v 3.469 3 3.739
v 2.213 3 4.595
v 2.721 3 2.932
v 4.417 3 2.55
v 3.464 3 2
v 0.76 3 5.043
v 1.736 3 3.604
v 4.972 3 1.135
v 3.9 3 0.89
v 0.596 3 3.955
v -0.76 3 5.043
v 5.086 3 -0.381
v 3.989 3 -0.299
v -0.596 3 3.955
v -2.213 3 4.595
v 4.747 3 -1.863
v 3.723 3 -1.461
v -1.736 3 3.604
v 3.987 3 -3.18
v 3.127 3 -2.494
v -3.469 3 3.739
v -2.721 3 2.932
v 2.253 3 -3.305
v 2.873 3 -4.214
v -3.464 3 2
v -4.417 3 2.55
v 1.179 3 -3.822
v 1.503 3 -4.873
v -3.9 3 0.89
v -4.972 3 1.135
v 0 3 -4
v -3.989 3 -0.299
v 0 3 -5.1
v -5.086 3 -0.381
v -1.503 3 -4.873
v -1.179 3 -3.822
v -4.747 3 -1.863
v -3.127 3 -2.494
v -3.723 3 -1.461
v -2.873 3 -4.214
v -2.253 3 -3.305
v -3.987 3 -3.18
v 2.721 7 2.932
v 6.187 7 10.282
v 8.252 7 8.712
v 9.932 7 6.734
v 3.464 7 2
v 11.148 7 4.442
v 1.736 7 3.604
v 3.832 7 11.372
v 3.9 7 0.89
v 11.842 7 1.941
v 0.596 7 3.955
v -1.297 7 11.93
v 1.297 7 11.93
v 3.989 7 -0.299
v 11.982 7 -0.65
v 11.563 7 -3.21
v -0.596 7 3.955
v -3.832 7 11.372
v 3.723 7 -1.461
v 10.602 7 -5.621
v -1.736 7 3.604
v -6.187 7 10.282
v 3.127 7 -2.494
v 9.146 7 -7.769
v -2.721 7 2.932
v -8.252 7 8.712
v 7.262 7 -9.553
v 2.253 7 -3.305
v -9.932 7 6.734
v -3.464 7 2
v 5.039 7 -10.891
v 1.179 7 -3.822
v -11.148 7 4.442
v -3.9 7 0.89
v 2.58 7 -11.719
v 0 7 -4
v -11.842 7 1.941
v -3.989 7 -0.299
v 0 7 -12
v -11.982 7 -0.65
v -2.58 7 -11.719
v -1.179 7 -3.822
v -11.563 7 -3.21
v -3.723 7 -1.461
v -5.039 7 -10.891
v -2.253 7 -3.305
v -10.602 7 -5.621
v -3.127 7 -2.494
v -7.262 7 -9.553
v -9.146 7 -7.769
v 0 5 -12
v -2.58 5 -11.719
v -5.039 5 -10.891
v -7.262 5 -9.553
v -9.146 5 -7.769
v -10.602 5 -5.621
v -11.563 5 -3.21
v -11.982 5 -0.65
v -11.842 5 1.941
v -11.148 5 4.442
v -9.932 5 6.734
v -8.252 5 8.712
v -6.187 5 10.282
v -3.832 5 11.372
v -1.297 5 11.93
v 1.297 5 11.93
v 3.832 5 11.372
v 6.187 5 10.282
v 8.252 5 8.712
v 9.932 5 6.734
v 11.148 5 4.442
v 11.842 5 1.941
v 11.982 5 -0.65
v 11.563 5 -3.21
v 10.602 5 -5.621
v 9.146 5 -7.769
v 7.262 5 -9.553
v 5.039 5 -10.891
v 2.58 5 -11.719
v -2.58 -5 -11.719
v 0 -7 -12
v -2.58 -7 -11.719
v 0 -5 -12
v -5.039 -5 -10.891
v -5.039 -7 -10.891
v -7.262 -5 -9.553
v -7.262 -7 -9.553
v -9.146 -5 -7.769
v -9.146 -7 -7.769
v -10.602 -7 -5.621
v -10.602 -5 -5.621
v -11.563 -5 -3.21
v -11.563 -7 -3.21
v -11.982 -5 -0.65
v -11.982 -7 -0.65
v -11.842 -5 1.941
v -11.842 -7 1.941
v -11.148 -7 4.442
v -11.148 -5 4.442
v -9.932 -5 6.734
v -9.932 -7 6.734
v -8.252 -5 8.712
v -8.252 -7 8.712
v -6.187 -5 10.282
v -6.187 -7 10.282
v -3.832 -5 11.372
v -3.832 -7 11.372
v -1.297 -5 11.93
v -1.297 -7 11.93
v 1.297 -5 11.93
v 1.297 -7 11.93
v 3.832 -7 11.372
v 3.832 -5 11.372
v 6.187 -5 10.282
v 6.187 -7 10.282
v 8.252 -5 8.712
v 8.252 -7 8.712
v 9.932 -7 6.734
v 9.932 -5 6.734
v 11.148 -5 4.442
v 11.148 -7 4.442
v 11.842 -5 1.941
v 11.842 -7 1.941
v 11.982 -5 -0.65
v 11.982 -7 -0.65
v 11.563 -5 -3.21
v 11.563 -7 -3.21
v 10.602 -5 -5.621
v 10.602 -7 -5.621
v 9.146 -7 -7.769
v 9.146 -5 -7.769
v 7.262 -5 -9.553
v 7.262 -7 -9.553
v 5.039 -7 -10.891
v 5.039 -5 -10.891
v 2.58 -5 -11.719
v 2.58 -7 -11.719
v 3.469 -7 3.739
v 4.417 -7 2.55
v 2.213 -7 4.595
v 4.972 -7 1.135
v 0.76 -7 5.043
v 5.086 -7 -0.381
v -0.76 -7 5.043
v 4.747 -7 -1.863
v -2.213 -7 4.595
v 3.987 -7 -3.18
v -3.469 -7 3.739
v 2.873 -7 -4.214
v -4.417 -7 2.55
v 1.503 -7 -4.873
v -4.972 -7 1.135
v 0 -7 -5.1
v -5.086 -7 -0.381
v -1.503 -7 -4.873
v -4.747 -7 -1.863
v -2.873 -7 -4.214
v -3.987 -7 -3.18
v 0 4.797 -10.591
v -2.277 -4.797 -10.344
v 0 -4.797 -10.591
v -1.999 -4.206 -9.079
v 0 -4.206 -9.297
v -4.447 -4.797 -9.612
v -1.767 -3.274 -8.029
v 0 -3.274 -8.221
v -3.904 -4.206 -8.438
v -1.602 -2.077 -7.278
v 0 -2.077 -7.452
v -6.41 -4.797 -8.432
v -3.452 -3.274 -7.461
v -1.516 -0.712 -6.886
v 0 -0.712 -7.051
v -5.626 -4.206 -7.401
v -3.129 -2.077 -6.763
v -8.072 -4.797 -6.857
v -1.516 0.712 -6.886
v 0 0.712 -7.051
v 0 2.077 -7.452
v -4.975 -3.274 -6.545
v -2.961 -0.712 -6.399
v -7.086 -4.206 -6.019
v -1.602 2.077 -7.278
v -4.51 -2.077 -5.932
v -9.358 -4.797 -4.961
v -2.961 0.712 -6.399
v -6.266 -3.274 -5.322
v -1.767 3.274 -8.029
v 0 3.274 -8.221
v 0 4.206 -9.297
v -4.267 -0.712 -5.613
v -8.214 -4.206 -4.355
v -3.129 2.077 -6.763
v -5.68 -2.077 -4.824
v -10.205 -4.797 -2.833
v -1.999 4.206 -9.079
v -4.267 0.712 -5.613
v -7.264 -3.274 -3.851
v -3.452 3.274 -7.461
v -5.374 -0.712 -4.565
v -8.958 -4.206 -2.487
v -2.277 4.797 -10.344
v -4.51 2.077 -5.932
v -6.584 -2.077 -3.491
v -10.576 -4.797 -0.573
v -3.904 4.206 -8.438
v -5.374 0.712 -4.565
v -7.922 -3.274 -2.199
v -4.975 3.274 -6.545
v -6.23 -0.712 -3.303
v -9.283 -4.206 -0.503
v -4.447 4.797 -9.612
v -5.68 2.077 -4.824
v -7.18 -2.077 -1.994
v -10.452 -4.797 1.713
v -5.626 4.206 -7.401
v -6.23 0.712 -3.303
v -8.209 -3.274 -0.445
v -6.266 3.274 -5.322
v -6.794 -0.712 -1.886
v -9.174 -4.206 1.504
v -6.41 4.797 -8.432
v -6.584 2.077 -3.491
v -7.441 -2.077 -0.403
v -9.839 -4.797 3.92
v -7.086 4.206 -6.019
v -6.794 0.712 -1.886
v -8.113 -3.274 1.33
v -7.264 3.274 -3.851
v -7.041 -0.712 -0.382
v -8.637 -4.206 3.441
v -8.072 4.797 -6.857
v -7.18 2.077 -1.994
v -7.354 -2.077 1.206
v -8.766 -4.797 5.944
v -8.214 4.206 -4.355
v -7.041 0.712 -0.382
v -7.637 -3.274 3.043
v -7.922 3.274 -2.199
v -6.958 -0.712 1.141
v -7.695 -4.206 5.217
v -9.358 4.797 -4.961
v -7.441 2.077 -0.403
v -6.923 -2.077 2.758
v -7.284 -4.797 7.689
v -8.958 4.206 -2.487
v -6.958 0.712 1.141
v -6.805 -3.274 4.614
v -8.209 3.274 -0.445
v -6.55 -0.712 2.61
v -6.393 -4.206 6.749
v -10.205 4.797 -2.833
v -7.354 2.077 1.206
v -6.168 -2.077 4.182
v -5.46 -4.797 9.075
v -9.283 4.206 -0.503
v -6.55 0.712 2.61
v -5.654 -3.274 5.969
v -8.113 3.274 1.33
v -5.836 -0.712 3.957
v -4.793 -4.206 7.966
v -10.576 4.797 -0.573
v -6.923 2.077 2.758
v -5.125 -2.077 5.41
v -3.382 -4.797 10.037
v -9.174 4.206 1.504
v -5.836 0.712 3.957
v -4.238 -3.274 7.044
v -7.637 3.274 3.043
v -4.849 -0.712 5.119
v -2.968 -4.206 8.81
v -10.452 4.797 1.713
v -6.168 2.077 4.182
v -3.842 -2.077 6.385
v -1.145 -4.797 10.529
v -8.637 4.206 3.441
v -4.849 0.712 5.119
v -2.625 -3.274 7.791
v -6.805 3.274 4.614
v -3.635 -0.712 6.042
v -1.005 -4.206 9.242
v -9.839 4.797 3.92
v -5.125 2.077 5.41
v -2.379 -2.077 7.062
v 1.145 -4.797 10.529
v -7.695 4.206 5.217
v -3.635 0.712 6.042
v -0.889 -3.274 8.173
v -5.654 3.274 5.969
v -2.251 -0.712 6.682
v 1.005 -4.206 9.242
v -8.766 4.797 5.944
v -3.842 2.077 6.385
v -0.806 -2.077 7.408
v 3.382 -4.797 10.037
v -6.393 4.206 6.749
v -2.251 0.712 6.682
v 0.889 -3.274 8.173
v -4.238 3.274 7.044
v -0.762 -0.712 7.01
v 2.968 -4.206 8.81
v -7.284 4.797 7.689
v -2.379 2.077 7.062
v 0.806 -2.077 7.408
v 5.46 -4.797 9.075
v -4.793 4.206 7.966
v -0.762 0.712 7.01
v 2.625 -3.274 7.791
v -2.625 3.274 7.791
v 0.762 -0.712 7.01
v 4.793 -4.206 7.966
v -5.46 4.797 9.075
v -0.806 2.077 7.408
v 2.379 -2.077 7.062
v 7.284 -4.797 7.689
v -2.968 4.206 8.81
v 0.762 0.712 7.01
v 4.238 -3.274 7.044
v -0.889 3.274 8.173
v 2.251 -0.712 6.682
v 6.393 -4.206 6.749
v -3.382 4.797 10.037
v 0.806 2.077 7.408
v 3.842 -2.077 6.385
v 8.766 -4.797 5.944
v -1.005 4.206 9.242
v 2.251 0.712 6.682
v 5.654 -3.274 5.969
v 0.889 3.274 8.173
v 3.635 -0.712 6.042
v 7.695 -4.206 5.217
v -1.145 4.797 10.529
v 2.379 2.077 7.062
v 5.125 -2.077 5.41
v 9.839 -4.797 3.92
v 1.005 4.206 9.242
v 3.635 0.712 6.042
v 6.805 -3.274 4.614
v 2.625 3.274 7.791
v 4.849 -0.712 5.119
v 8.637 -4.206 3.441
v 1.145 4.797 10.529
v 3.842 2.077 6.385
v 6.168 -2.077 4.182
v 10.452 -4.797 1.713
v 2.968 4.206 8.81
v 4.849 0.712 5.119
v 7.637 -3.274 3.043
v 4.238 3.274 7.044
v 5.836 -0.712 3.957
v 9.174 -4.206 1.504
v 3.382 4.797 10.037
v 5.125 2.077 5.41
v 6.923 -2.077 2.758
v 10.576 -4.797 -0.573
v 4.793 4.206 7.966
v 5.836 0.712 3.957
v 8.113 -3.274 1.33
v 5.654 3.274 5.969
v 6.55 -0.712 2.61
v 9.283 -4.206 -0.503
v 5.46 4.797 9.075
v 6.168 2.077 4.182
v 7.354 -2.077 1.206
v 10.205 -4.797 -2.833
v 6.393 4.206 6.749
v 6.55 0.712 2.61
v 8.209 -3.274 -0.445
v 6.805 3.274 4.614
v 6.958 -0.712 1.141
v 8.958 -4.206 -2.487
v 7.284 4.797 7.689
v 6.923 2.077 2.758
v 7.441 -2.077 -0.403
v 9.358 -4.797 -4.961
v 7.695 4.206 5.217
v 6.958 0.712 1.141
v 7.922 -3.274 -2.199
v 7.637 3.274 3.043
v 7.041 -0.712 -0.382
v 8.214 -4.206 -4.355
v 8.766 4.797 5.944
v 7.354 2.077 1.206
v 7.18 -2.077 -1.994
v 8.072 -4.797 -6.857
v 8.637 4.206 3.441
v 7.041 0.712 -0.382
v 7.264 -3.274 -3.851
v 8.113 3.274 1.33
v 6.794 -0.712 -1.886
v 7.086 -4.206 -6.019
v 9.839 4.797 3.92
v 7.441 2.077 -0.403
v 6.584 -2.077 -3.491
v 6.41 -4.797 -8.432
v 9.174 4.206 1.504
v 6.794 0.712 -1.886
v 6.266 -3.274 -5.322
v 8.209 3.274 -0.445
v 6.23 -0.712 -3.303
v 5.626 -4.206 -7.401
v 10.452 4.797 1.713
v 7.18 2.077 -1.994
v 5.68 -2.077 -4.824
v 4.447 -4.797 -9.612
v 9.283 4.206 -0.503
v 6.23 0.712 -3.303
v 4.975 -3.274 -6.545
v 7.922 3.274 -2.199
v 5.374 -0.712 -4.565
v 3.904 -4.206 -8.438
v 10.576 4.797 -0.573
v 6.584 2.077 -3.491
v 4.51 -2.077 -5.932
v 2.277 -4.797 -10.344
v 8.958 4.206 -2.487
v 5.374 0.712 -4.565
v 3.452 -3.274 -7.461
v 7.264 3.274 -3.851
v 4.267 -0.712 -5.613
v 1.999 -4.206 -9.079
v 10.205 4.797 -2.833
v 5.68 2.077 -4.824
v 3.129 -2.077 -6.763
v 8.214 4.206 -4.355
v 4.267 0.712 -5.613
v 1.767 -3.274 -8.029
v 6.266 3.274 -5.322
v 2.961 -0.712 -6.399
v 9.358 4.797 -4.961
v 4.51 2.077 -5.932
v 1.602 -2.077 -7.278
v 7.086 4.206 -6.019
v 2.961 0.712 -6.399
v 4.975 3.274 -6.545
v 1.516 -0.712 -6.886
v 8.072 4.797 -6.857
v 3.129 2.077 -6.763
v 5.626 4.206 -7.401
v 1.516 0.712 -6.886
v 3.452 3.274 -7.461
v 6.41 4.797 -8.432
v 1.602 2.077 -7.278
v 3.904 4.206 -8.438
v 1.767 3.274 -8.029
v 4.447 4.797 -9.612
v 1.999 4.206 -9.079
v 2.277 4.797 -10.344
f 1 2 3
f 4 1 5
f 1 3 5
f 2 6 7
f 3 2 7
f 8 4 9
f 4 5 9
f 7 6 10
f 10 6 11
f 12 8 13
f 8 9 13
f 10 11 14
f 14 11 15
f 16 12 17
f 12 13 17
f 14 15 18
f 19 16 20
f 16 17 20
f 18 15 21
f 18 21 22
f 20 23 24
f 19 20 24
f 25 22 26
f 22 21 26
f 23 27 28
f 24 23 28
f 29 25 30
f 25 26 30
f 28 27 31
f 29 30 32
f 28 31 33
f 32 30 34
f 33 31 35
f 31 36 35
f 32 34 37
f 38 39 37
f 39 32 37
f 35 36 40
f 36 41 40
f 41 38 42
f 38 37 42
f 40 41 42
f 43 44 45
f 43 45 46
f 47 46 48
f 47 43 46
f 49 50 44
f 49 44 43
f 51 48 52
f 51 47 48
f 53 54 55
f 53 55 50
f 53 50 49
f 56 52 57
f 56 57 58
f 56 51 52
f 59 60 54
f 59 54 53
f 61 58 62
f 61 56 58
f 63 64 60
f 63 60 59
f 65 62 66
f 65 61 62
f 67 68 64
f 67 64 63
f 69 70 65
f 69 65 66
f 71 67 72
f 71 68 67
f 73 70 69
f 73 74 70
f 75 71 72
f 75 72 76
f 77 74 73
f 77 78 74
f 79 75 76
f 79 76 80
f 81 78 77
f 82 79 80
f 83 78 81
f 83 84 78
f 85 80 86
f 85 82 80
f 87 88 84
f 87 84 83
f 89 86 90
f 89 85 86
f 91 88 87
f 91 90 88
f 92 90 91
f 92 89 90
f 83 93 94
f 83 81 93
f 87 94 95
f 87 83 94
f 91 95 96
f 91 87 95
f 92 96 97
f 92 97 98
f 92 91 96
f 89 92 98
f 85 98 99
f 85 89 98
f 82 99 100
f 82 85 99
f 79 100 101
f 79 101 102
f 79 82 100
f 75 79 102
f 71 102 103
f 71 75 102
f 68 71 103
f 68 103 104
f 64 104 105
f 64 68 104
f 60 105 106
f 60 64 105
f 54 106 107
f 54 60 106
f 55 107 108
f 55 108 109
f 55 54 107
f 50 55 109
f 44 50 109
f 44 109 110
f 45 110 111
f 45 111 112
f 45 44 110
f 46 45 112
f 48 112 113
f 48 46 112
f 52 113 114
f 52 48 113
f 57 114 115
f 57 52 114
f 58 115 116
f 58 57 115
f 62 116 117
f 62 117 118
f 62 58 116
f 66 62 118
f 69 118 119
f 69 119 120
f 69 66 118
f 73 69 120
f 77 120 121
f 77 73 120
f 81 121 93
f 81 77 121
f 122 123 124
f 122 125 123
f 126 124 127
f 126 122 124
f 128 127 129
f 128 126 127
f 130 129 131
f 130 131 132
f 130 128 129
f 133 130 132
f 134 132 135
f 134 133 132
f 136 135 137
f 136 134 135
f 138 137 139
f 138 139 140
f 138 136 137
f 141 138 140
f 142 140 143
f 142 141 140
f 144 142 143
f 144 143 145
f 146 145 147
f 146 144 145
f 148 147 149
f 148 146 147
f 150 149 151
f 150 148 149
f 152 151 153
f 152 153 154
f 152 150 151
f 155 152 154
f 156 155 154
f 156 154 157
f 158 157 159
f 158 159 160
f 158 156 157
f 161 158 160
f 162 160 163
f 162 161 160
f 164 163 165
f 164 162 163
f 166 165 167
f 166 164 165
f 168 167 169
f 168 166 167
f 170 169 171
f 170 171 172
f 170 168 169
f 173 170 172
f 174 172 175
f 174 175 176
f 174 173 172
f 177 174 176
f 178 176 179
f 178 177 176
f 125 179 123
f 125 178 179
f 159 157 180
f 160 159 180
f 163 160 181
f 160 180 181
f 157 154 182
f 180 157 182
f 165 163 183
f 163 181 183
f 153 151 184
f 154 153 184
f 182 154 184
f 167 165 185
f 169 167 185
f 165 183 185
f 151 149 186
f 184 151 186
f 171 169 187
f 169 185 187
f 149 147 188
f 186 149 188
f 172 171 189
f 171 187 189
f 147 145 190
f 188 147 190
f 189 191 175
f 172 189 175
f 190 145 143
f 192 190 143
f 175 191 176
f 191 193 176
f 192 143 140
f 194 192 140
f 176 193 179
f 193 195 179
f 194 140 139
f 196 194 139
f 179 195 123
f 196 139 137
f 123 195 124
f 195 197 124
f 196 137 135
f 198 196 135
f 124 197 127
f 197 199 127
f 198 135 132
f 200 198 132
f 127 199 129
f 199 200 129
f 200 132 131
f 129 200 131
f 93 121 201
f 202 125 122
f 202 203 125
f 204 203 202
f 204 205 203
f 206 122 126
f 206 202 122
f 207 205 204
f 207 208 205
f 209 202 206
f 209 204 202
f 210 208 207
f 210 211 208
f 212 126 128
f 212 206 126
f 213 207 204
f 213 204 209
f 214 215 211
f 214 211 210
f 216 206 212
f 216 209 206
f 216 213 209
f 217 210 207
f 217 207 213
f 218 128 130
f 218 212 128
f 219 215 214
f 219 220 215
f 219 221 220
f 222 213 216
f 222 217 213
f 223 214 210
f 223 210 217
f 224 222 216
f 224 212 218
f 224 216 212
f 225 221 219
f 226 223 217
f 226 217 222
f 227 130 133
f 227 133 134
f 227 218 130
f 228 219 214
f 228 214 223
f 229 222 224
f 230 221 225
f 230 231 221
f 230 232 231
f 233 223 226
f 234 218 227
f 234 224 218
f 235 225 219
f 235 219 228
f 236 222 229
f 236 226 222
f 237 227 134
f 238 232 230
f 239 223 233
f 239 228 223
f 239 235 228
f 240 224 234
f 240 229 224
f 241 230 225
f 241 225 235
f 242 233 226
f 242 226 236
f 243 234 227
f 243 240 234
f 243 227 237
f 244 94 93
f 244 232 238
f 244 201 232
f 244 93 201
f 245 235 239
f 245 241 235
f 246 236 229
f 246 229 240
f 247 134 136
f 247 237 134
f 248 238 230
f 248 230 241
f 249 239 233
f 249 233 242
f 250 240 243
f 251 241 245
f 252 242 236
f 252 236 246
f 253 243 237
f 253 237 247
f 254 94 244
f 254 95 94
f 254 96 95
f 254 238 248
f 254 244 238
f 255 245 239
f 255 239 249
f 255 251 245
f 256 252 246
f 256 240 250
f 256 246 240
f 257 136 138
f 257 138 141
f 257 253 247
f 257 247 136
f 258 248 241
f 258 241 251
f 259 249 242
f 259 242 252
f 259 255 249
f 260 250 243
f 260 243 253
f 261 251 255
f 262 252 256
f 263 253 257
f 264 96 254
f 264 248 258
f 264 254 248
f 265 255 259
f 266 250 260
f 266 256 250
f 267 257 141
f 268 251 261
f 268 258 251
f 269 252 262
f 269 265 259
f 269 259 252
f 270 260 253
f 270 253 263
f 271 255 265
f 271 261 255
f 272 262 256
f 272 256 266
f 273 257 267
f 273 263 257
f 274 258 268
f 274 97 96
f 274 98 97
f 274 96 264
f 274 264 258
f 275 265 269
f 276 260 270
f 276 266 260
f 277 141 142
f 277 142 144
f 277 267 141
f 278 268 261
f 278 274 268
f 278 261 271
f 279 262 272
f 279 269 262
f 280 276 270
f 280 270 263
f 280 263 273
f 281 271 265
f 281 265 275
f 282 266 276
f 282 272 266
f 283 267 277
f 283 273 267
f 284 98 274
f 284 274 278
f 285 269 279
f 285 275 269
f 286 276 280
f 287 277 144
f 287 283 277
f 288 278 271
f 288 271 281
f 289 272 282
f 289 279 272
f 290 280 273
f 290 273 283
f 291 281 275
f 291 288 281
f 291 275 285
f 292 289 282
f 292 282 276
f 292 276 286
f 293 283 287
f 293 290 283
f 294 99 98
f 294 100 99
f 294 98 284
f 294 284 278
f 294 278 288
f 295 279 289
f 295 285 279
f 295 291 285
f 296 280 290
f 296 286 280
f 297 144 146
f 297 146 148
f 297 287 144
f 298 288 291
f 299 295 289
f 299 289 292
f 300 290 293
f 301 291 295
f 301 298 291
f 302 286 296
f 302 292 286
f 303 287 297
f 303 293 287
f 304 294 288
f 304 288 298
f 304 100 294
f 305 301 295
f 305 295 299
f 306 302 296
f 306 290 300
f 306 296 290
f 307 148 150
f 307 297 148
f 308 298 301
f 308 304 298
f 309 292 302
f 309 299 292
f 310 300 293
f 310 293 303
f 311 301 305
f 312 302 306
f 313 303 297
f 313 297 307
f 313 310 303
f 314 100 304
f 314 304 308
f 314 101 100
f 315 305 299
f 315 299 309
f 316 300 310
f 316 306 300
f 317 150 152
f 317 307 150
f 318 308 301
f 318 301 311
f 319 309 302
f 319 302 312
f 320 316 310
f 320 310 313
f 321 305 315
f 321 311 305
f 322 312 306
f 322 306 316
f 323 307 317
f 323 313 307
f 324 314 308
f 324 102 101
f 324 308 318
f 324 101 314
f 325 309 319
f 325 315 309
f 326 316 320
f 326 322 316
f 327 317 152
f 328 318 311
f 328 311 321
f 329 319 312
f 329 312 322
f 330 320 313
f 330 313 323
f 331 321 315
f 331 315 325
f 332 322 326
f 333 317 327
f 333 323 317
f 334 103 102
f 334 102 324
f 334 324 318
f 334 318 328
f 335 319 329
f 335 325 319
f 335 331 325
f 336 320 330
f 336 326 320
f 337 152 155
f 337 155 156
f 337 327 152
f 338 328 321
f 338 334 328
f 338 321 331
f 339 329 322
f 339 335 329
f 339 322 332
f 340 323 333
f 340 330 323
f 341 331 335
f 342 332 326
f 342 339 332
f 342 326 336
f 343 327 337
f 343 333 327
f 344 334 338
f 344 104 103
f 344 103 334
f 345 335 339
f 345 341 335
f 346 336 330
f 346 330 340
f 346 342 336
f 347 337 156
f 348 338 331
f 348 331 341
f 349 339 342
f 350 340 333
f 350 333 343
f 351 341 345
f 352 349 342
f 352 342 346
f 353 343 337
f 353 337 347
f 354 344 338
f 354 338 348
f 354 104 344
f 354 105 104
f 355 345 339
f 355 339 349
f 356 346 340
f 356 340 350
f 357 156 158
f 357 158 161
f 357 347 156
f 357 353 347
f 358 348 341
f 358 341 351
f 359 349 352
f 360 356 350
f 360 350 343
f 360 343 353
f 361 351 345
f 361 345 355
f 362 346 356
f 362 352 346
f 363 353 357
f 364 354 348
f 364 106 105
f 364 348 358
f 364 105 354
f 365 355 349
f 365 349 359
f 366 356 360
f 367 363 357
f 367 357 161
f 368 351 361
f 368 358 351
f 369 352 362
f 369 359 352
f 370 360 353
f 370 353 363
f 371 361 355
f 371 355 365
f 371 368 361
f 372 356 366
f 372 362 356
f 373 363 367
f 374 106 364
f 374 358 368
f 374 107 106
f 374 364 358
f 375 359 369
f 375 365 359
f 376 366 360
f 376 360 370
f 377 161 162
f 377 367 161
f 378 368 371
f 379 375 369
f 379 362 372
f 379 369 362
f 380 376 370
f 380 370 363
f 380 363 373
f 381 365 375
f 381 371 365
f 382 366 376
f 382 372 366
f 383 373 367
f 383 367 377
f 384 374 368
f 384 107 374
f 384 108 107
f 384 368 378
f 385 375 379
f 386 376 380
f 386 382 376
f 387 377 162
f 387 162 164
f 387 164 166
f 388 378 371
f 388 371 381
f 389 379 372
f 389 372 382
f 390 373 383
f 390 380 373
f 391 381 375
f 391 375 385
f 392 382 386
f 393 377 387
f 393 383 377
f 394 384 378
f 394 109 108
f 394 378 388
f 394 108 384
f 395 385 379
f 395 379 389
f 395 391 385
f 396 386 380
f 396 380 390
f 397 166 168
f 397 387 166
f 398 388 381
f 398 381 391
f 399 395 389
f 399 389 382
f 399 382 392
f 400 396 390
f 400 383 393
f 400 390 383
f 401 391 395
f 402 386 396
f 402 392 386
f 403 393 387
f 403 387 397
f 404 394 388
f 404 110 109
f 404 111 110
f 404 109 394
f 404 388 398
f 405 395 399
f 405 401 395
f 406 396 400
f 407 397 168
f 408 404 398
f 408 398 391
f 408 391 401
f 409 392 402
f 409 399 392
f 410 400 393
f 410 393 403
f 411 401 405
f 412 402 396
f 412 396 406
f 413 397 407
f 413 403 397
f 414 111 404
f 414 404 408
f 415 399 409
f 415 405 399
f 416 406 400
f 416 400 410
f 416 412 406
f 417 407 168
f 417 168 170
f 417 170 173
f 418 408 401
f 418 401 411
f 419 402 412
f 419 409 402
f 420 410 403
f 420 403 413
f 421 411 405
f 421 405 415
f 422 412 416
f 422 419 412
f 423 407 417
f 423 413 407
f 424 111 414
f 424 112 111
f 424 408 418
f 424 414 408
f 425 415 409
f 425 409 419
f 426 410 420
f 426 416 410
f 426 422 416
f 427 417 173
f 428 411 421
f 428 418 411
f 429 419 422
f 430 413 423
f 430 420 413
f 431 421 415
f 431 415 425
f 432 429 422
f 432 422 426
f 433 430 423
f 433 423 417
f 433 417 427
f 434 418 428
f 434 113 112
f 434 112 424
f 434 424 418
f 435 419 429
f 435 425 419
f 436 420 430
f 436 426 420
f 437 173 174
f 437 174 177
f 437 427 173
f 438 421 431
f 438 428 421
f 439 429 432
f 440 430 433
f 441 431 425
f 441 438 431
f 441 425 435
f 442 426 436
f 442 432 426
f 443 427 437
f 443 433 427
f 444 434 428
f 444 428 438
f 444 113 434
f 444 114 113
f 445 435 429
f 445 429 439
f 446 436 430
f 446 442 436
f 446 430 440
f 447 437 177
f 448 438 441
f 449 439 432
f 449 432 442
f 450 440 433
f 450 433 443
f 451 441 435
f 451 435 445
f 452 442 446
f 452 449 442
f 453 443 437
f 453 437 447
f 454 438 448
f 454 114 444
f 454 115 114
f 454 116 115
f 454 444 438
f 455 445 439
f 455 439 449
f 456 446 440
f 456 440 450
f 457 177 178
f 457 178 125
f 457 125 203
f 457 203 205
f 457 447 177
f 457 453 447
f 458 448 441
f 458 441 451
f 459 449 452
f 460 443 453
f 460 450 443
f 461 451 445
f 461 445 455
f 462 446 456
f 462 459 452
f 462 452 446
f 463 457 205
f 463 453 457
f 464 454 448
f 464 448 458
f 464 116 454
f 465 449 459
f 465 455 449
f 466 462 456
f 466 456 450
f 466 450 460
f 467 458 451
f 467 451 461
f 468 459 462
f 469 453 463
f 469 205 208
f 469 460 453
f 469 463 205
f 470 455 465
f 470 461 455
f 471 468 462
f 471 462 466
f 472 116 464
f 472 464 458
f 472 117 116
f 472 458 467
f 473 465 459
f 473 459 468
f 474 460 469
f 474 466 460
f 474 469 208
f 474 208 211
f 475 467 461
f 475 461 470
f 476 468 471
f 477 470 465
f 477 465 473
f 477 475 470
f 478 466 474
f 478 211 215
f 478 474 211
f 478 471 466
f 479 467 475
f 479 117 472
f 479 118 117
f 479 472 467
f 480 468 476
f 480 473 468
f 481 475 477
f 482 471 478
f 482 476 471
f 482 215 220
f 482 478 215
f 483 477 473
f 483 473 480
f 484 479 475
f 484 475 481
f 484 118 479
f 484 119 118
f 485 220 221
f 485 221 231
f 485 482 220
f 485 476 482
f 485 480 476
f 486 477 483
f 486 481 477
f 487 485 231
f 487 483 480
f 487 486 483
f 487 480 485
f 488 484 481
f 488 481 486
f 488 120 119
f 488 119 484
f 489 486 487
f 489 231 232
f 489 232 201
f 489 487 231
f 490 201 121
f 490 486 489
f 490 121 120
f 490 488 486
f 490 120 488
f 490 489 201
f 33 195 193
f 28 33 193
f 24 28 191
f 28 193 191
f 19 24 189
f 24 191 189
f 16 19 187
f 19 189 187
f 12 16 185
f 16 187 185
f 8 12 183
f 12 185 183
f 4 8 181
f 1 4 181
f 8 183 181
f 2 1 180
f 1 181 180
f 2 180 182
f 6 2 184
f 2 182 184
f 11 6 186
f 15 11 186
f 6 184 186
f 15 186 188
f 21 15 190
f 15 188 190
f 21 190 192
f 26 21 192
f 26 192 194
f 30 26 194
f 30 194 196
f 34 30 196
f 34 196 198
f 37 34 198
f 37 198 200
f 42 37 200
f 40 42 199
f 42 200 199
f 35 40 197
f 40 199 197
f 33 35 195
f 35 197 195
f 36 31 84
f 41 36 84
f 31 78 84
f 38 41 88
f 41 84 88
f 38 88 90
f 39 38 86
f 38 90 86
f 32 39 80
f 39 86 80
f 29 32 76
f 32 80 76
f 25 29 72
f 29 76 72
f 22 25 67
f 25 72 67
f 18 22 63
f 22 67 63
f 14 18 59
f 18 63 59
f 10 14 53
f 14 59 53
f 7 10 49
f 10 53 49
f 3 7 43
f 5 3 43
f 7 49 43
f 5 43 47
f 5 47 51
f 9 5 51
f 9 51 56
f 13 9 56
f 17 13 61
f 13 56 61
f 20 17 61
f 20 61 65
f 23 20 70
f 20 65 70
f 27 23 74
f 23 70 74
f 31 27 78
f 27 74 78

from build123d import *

# Parameters (mm, degrees)
SKETCH_9_W          = 1
SKETCH_9_H          = 4
SKETCH_10_R         = 5.1
CUT_EXTRUDE_1_DEPTH = 10


with BuildPart() as part:
    # 草图7 → 旋转1 (revolve)
    with BuildSketch(Plane.XY, mode=Mode.PRIVATE) as revolve_1_sk:
        with BuildLine():
            Line((-5, 4), (-5, -4))
            Line((-5, -4), (-5, -7))
            Line((-5, -7), (-12, -7))
            Line((-12, -7), (-12, -5))
            ThreePointArc((-12, -5), (-7, 0), (-12, 5))
            Line((-12, 5), (-12, 7))
            Line((-12, 7), (-5, 7))
            Line((-5, 7), (-5, 4))
        make_face()
    revolve(revolve_1_sk.sketch.rotate(Axis((0, 0, 0), (0, 1, 0)), 270), axis=Axis((0, 0, 0), (0, 1, 0)))

    # 草图9 → 旋转2 (revolve)
    with BuildSketch(Plane.XY, mode=Mode.PRIVATE) as revolve_2_sk:
        with Locations((-4.5, 5)):
            Rectangle(SKETCH_9_W, SKETCH_9_H)
        with Locations((-4.5, -5)):
            Rectangle(SKETCH_9_W, SKETCH_9_H)
    revolve(revolve_2_sk.sketch.rotate(Axis((0, 0, 0), (0, 1, 0)), 270), axis=Axis((0, 0, 0), (0, 1, 0)))

    # 草图10 → 切除-拉伸1 (cut)
    with BuildSketch(Plane.XZ.offset(7)):
        with Locations(Location((0, 0, 0), (0, 0, 270))):
            Circle(SKETCH_10_R)
    extrude(amount=-CUT_EXTRUDE_1_DEPTH, mode=Mode.SUBTRACT)


solid = part.part
